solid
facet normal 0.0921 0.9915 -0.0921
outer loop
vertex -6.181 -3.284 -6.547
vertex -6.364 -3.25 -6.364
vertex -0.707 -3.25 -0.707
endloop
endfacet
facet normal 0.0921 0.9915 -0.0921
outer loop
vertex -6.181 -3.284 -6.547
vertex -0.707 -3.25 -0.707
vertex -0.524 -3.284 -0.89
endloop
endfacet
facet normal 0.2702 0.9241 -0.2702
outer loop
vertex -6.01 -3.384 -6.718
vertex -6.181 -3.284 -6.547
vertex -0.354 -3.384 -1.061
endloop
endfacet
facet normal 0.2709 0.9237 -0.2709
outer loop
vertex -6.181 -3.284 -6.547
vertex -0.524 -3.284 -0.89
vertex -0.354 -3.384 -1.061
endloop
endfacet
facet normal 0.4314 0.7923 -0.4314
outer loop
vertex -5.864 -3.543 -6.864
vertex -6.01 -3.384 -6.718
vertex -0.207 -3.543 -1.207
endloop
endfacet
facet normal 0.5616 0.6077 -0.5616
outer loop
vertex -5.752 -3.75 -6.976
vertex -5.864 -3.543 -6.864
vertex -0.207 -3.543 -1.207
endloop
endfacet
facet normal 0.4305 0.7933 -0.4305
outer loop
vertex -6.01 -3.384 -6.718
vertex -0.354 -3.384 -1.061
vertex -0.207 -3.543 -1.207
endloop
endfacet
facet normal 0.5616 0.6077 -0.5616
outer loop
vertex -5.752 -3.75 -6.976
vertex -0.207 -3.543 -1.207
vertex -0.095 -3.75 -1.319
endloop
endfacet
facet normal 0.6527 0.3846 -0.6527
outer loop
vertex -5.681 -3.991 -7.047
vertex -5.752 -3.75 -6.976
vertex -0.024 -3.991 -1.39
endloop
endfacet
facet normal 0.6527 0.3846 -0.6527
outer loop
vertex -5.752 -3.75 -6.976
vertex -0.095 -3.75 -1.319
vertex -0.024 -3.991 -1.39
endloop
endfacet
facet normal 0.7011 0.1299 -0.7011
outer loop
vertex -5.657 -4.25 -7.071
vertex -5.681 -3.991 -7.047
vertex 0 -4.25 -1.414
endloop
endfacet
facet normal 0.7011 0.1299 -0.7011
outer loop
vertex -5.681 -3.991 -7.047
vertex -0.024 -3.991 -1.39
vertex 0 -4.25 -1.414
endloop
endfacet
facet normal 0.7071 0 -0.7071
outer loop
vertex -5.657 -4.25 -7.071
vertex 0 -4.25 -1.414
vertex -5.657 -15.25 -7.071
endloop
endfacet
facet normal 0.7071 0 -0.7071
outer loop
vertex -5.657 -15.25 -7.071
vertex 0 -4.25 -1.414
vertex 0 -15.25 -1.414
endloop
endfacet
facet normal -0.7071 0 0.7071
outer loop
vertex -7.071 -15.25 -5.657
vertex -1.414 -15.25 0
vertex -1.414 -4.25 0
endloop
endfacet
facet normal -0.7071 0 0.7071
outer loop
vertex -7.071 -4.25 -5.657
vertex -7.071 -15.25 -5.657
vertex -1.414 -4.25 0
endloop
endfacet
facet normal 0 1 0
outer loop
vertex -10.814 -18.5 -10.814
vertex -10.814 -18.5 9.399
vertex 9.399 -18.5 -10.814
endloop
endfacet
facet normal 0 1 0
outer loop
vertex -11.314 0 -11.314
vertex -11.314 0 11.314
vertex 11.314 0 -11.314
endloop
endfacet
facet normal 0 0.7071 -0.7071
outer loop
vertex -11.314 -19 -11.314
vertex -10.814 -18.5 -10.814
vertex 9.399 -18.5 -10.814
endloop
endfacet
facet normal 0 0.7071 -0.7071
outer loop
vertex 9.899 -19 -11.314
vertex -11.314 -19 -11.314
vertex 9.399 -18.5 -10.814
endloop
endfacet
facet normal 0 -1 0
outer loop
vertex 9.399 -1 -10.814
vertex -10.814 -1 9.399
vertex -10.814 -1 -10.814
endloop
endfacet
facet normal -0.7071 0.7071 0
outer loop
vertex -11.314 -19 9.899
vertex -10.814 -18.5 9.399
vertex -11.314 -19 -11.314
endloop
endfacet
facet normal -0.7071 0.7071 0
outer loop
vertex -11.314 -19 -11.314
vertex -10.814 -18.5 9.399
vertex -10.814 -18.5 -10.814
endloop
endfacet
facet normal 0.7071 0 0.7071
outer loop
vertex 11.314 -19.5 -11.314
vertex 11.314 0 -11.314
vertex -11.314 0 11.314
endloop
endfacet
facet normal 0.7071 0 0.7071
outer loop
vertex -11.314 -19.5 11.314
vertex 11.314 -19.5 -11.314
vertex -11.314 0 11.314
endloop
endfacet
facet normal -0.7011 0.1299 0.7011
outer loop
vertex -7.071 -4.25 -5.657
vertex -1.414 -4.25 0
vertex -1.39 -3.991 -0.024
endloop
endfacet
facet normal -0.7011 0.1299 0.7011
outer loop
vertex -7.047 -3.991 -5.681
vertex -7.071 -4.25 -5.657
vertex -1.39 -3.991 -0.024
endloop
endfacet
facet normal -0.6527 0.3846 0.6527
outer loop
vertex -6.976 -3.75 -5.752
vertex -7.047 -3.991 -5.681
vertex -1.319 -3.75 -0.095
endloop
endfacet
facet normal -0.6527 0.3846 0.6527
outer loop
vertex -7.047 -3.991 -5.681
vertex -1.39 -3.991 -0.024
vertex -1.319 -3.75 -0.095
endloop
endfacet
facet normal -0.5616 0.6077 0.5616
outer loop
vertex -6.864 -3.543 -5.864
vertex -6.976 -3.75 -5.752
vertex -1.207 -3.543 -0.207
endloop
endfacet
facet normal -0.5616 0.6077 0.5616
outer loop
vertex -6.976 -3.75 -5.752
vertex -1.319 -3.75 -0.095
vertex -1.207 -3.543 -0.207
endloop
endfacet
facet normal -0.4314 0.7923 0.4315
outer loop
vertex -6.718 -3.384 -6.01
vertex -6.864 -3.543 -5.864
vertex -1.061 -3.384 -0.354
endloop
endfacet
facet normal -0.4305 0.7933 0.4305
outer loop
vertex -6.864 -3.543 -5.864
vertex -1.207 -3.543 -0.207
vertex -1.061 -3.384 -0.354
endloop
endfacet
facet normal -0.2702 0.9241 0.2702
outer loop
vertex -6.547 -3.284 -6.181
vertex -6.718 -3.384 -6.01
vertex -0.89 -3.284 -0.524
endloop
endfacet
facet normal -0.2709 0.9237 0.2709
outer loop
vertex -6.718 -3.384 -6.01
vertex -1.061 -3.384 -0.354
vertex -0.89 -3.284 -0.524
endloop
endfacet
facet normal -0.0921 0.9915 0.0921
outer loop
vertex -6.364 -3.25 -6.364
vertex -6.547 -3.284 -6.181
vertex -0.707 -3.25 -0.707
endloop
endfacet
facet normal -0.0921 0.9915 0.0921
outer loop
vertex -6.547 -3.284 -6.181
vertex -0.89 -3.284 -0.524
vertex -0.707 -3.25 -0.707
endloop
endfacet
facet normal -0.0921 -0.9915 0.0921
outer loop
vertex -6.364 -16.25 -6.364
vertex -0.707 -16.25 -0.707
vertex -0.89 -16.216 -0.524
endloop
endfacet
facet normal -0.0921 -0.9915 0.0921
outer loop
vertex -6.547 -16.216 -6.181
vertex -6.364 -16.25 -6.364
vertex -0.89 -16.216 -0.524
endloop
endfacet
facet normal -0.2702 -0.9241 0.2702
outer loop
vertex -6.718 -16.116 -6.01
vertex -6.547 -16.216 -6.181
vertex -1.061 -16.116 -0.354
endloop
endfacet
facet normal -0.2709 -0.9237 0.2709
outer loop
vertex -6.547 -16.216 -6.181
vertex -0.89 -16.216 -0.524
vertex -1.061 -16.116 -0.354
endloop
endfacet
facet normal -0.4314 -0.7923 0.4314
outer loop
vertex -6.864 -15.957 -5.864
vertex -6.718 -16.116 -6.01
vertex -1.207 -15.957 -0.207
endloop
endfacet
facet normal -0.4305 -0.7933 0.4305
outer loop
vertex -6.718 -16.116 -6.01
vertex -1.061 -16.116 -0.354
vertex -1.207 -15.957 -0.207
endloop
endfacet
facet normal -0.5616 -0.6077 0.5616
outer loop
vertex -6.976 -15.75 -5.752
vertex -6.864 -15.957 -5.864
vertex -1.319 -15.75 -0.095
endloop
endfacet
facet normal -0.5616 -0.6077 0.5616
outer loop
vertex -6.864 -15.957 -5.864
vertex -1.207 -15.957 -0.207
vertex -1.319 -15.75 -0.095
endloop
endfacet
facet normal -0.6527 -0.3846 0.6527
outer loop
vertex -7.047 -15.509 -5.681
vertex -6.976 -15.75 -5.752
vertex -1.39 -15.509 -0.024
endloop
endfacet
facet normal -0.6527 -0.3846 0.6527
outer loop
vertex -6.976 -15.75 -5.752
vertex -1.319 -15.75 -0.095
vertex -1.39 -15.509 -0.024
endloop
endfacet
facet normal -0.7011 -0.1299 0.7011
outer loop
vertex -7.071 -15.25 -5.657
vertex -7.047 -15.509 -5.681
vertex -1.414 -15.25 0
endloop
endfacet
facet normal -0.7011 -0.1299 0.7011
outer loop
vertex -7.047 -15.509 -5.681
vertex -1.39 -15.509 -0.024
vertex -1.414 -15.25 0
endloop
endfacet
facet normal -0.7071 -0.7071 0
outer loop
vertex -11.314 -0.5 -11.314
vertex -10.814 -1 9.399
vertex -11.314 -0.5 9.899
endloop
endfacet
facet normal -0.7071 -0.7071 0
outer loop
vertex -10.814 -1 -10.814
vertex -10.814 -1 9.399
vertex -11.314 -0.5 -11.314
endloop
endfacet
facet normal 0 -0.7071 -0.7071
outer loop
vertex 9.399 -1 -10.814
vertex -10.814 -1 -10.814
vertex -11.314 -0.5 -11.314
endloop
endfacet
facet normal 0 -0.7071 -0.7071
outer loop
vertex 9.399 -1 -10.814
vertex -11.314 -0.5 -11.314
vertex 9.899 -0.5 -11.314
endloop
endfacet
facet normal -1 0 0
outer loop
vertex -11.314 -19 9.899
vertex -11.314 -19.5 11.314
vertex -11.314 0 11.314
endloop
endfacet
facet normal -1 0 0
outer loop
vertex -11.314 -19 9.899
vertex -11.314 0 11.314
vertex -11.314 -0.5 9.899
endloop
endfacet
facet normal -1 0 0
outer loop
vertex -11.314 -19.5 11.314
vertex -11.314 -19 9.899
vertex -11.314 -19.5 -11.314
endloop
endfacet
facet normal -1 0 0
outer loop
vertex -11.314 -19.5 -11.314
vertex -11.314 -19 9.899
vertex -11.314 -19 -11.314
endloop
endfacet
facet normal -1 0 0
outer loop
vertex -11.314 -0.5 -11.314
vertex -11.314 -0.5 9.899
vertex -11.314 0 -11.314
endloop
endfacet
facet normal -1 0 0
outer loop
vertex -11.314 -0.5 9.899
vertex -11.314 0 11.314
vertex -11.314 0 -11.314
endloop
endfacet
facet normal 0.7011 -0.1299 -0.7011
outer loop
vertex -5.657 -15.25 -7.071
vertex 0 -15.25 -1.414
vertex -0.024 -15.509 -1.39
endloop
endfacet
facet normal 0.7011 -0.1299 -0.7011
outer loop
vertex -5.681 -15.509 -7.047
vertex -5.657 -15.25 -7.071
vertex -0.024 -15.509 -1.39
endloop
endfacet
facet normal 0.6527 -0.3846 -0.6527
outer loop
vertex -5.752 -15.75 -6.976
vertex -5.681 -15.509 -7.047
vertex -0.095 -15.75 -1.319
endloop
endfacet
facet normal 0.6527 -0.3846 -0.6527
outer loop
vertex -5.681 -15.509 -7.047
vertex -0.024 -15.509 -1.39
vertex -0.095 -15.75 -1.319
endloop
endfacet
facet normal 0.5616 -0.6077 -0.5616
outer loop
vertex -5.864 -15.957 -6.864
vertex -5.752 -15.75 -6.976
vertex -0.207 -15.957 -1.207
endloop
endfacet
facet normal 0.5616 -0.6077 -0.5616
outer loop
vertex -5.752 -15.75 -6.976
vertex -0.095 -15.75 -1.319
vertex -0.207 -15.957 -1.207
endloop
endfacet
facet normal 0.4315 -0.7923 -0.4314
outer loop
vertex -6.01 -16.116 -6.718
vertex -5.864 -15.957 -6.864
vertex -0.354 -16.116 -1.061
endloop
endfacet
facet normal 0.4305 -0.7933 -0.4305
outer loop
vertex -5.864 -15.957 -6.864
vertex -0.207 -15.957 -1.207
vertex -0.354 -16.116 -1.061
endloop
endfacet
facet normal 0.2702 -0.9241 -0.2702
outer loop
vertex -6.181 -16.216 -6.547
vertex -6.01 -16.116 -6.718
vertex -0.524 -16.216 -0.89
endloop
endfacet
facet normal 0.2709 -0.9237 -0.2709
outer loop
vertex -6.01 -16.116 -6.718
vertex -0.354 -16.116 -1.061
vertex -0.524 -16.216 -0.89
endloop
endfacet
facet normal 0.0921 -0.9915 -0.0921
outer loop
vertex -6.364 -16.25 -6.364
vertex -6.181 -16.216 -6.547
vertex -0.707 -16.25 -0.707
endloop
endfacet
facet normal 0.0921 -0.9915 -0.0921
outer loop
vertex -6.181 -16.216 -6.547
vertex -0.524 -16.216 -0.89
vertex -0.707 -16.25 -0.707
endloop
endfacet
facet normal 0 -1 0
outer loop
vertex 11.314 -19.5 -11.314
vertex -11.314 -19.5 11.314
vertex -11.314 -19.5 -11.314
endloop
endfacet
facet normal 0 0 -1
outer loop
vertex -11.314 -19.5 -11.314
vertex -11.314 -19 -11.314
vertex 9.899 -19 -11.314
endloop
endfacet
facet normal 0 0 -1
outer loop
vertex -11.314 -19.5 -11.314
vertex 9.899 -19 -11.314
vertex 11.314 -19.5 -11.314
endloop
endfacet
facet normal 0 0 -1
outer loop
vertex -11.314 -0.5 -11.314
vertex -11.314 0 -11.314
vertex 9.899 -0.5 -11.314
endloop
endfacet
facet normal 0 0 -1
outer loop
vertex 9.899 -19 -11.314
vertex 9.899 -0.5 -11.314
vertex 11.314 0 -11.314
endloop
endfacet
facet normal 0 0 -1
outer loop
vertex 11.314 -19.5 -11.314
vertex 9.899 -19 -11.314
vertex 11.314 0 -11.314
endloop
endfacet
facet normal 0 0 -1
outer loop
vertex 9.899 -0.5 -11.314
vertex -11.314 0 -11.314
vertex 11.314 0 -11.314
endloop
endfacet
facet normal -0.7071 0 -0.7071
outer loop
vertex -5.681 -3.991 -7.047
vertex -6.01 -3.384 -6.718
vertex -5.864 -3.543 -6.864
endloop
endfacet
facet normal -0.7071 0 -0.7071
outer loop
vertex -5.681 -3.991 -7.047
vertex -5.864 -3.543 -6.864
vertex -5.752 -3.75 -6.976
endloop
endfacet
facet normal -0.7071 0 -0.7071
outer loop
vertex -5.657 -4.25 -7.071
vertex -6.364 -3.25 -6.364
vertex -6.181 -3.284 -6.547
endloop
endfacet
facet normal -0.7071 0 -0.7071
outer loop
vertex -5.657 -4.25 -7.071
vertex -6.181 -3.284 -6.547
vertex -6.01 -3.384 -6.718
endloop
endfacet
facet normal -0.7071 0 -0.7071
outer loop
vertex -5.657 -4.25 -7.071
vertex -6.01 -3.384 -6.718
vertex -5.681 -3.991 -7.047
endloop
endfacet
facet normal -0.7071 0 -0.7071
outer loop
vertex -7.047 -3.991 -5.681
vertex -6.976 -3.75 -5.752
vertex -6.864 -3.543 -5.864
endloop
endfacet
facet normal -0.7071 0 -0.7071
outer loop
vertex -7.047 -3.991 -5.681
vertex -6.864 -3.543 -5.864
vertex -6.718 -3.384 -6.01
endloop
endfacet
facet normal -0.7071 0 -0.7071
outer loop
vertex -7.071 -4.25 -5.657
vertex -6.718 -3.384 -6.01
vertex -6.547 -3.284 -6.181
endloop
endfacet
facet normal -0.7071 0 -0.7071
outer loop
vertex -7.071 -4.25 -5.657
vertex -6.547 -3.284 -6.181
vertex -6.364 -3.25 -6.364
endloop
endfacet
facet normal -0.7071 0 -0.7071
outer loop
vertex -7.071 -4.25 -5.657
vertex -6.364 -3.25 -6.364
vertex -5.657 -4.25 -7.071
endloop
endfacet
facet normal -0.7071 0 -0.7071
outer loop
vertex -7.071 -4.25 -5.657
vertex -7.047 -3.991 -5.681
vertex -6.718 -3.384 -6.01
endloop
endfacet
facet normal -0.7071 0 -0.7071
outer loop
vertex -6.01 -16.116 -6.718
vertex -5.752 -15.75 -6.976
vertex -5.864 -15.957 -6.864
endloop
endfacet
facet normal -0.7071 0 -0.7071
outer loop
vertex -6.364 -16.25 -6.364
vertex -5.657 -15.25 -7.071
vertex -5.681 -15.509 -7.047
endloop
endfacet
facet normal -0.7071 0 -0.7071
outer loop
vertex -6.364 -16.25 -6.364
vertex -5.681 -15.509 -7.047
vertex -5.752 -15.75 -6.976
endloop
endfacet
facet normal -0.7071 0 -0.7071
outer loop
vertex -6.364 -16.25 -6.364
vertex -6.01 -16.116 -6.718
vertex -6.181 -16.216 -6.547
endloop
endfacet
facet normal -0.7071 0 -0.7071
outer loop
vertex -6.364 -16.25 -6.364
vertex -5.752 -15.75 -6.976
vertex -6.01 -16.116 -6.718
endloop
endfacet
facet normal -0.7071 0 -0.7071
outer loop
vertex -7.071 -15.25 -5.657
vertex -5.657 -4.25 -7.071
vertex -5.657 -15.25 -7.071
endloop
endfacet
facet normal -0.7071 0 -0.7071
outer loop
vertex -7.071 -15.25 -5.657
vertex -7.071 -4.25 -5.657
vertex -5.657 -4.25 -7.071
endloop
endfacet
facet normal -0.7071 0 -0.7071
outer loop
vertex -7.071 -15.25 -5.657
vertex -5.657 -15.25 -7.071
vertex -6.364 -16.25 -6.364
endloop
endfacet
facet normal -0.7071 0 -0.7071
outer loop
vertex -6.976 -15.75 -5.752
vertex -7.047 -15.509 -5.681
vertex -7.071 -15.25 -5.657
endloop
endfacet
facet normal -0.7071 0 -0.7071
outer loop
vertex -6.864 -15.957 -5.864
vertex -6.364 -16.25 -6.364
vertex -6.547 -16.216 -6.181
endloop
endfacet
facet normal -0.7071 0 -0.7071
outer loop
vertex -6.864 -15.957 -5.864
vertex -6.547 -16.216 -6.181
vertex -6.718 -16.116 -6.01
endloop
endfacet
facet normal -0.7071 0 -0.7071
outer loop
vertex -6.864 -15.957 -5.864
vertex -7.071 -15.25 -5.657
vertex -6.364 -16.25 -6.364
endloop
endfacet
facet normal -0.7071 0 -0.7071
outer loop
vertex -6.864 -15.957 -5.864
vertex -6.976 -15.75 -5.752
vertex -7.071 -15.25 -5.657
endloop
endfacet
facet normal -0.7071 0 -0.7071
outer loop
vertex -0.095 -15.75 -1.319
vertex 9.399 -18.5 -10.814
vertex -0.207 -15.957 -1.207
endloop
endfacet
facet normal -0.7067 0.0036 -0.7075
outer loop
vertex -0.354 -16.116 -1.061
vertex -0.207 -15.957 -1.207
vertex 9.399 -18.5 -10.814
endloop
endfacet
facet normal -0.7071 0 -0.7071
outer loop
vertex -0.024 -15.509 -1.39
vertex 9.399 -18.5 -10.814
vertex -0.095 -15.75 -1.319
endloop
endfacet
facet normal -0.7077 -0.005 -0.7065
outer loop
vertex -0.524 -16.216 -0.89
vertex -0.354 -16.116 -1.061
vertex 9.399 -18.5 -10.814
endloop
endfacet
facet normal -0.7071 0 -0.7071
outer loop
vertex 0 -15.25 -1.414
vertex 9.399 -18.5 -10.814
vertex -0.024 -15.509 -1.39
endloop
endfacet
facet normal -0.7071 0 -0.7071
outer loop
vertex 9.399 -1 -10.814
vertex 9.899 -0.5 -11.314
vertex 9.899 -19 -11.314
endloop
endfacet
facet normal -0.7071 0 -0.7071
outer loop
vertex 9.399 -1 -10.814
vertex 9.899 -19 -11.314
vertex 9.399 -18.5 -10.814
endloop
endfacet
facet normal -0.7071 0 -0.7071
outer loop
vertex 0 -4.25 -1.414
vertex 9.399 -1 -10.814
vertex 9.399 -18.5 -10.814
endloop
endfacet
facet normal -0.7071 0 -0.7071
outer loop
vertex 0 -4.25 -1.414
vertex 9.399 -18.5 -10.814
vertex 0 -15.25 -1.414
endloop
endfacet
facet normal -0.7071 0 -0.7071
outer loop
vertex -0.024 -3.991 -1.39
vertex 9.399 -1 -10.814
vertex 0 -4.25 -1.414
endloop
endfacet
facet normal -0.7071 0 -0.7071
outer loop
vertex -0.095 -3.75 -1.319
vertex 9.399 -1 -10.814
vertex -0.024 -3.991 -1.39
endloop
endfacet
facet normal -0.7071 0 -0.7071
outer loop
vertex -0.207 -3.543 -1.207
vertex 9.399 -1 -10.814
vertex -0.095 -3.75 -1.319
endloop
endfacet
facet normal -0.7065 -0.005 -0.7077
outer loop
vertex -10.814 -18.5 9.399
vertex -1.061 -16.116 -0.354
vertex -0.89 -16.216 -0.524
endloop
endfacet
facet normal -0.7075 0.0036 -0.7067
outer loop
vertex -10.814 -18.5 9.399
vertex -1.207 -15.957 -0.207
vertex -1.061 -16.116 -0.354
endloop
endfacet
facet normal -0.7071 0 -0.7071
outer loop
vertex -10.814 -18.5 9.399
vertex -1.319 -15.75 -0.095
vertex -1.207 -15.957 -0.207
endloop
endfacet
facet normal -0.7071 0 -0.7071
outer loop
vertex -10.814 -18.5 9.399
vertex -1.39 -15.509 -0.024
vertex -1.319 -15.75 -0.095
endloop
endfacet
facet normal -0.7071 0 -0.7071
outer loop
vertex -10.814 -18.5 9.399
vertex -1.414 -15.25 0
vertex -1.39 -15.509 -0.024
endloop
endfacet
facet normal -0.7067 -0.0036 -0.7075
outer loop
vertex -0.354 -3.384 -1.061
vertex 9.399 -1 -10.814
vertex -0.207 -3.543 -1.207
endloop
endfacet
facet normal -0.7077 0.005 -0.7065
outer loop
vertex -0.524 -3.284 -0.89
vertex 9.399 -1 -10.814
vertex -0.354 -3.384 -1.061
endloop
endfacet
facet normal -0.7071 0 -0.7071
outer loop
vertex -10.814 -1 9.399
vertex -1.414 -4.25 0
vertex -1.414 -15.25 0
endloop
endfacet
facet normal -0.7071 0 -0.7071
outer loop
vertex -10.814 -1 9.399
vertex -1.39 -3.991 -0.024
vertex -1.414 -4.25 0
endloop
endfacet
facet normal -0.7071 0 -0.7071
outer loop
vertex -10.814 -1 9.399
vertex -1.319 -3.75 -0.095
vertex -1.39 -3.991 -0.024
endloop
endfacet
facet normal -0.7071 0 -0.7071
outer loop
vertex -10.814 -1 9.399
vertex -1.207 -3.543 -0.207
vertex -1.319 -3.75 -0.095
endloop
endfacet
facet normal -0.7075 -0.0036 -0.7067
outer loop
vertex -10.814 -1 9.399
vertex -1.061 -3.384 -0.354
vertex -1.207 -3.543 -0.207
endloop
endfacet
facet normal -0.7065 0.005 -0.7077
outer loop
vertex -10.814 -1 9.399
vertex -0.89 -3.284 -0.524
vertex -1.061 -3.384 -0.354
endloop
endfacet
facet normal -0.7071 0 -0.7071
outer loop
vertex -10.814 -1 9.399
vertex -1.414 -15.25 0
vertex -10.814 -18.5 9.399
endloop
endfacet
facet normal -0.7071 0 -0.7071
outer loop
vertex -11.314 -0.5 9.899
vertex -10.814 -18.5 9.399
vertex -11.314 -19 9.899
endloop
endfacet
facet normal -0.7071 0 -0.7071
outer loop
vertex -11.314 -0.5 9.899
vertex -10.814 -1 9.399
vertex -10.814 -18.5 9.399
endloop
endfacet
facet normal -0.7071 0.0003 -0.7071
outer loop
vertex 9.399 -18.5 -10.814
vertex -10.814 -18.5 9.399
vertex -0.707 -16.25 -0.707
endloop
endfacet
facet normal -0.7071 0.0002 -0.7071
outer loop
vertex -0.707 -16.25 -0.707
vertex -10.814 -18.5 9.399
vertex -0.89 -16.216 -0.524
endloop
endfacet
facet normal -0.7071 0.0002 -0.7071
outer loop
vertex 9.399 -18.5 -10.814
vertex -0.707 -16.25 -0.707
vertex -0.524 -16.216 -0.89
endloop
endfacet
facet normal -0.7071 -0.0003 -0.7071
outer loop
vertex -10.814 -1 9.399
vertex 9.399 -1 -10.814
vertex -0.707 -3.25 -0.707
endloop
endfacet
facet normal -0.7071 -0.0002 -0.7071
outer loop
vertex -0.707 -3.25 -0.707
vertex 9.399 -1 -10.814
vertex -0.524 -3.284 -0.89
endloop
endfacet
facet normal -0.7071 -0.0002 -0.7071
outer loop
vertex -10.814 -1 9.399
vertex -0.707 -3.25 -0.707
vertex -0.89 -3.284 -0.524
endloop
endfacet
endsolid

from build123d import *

# Parameters (mm, degrees)
F1_DEPTH = 19.5
F2_T     = -1
F4_DEPTH = 8
F5_SIZE  = 0.5


with BuildPart() as f1:
    # F0 (on Front) → F1 (new body)
    with BuildSketch(Plane.XZ):
        Polygon((-11.313708499, 11.313708499), (-11.313708499, -11.313708499), (11.313708499, -11.313708499), align=None)
    extrude(amount=F1_DEPTH)

    # F2
    f2_openings = [f1.faces().sort_by_distance(p)[0] for p in [
        (0, -9.75, -11.313708),
        (-11.313708, -9.75, 0),
    ]]
    offset(amount=F2_T, openings=f2_openings)

    # F3 (on face) → F4 (join)
    with BuildSketch(Plane(origin=(-0.7071067812, 0, -0.7071067812), x_dir=(0, -1, 0), z_dir=(-0.7071067812, 0, -0.7071067812))):
        with BuildLine():
            Line((15.25, 1), (4.25, 1))
            ThreePointArc((4.25, 1), (3.5428932188, 0.7071067812), (3.25, 0))
            ThreePointArc((3.25, 0), (3.5428932188, -0.7071067812), (4.25, -1))
            Line((4.25, -1), (15.25, -1))
            ThreePointArc((15.25, -1), (15.9571067812, -0.7071067812), (16.25, 0))
            ThreePointArc((16.25, 0), (15.9571067812, 0.7071067812), (15.25, 1))
        make_face()
    extrude(amount=F4_DEPTH)

    # F5
    f5_edges = [f1.edges().sort_by_distance(p)[0] for p in [
        (-0.707107, -1, -11.313708),
        (-11.313708, -1, -0.707107),
        (-11.313708, -18.5, -0.707107),
        (-0.707107, -18.5, -11.313708),
    ]]
    chamfer(f5_edges, length=F5_SIZE)


solid = f1.part
